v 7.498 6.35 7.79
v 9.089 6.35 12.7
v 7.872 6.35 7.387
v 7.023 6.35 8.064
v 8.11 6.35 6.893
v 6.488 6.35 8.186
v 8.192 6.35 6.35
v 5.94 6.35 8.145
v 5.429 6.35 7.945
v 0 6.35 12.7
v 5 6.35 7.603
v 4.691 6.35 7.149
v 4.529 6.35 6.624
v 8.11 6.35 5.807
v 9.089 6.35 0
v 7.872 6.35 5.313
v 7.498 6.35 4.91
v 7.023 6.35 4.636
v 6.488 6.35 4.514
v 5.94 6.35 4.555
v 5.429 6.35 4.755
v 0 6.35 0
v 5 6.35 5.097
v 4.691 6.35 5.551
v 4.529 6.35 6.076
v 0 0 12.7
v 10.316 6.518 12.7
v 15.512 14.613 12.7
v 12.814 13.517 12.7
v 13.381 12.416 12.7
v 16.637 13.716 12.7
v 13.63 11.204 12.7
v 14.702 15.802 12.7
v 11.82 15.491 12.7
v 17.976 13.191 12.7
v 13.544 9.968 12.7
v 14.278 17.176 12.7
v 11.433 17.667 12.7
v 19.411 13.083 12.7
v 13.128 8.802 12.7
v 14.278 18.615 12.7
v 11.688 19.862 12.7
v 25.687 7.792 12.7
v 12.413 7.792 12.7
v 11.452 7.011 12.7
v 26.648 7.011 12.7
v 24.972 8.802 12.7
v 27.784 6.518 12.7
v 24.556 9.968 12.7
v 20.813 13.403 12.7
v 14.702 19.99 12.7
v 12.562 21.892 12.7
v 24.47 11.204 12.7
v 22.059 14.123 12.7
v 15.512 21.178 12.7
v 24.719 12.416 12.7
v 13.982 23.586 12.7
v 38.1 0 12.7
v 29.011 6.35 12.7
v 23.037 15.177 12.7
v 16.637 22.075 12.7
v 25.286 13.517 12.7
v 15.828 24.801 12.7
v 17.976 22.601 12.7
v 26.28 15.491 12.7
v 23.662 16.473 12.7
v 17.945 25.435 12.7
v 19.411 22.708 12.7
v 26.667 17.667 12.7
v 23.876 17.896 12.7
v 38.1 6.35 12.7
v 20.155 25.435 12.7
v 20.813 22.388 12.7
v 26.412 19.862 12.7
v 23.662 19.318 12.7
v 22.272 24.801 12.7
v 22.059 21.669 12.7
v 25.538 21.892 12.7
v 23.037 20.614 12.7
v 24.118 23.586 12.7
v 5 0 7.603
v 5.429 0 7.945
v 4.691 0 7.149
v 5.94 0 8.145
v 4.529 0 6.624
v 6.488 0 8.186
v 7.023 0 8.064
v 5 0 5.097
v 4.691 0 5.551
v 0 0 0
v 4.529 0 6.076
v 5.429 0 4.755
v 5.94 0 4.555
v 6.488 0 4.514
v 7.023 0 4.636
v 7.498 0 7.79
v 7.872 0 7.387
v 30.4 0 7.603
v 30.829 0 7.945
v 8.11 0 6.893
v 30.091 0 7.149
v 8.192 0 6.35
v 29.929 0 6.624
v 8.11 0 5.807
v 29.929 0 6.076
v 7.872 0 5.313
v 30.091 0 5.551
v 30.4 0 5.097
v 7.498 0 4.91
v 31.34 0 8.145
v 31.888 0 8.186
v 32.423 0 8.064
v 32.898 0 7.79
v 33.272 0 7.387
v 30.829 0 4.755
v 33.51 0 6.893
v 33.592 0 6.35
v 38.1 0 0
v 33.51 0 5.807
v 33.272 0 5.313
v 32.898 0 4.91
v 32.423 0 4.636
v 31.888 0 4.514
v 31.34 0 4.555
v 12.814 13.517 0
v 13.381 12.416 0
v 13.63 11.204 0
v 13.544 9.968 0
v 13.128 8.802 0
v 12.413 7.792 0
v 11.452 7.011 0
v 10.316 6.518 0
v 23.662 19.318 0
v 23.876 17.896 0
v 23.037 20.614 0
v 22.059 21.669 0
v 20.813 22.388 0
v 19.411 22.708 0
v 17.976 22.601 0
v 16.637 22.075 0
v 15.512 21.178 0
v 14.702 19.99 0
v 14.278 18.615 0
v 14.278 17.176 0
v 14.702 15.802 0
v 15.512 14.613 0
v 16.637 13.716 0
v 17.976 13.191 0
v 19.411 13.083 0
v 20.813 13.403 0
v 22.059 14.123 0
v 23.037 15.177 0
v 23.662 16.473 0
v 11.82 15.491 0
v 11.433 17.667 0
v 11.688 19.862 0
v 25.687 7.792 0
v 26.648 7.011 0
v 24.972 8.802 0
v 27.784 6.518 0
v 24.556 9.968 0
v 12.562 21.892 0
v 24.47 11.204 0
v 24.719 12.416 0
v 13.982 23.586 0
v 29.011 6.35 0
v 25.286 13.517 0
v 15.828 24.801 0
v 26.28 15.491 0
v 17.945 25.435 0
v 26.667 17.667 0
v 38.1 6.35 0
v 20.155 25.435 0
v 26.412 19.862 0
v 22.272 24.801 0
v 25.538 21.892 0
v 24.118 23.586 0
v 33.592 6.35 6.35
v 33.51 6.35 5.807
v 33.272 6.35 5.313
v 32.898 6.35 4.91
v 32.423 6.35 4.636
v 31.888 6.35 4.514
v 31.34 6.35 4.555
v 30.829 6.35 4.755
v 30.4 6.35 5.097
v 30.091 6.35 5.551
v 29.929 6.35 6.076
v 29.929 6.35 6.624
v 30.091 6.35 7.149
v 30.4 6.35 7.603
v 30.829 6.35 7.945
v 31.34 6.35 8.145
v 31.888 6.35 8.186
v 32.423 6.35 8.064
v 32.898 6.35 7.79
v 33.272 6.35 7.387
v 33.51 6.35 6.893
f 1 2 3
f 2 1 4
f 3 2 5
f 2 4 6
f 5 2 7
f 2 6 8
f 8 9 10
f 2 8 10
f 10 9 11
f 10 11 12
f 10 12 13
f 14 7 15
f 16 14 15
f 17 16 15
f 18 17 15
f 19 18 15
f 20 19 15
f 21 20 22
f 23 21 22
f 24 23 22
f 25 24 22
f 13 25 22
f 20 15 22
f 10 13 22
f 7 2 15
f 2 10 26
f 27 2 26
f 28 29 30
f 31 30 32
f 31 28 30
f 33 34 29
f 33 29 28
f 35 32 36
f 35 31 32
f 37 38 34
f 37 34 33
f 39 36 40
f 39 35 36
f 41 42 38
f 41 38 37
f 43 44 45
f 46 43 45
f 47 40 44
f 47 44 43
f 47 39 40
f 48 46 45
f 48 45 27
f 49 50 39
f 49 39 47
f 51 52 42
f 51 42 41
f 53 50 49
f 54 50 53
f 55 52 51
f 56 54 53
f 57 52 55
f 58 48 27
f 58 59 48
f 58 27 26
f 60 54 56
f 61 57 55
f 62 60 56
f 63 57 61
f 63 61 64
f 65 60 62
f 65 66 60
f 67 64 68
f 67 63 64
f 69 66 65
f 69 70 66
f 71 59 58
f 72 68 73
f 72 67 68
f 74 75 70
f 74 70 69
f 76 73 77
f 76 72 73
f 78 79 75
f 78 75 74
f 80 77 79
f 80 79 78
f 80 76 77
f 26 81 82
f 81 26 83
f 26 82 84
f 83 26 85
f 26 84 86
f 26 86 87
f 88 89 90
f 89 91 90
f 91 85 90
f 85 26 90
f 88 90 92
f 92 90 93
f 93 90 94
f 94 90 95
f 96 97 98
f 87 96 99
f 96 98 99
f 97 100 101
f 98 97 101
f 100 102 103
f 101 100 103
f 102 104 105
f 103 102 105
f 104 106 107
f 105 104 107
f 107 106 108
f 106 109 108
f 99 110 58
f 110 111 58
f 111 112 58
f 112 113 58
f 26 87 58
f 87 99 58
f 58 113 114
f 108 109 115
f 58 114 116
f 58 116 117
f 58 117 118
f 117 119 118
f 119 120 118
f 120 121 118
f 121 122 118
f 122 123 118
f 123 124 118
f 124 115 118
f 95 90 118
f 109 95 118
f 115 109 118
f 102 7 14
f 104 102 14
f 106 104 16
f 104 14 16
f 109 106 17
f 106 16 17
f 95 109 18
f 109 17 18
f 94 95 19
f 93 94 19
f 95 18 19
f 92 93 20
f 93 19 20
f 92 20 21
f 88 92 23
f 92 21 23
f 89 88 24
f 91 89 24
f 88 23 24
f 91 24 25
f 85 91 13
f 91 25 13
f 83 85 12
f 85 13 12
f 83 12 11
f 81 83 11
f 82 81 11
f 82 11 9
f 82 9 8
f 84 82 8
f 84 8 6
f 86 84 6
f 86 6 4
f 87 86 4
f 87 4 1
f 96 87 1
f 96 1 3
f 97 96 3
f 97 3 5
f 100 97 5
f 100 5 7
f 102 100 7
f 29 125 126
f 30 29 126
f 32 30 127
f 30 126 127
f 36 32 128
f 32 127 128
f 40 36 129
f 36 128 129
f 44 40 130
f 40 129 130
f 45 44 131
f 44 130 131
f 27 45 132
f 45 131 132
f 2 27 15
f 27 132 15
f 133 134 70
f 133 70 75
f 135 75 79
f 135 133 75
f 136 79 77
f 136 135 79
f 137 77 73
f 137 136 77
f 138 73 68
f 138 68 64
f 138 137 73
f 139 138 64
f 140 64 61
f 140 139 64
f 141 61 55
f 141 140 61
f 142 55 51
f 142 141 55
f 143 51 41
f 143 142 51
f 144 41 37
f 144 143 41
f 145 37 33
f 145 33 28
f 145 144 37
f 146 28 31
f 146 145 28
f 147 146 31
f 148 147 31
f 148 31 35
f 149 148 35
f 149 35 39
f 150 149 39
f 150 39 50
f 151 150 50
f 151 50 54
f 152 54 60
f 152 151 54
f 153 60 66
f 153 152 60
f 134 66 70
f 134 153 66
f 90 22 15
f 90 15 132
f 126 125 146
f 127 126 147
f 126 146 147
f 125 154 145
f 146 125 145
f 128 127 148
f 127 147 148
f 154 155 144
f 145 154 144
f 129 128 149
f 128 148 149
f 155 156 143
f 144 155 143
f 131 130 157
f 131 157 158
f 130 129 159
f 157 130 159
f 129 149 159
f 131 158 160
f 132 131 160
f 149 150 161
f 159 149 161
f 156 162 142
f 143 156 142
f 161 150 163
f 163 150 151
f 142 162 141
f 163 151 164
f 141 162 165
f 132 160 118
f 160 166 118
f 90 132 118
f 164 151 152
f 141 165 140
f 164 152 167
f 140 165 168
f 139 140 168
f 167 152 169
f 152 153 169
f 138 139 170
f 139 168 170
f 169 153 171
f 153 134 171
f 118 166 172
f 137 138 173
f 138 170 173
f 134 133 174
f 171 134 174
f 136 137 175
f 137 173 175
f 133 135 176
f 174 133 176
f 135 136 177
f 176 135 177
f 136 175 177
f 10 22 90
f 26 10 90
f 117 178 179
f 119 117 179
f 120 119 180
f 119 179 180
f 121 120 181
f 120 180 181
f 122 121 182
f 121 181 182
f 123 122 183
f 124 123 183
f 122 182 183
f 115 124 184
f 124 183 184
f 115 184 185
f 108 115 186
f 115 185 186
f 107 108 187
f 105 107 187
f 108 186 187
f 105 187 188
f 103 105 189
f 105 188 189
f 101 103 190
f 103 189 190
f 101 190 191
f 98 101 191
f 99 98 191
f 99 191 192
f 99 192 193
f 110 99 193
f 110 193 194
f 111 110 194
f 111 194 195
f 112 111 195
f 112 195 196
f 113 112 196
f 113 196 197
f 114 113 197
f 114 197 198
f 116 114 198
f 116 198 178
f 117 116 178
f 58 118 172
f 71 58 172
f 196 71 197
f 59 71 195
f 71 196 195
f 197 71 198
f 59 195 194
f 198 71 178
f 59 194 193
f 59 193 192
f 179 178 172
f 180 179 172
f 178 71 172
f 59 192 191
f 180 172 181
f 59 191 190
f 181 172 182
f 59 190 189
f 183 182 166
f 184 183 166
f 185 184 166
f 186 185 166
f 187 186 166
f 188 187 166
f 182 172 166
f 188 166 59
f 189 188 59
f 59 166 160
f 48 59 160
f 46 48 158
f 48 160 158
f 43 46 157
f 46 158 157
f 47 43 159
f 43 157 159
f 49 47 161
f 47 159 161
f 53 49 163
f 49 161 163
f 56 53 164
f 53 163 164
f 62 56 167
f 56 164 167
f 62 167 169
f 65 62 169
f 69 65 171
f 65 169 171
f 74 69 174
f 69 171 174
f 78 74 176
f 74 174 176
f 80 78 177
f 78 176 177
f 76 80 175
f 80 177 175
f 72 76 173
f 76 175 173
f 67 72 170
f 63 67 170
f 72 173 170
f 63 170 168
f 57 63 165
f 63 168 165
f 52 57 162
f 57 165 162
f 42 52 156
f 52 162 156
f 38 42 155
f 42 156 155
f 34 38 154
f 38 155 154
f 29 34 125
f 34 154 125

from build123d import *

# Parameters (mm, degrees)
SKETCH1_R               = 4.826
BOSS_EXTRUDE1_DEPTH     = 12.7
SKETCH2_R               = 1.8415
CUT_EXTRUDE1_DEPTH      = 20.165748301
CUT_EXTRUDE1_DEPTH_BACK = 7.35


with BuildPart() as part:
    # Sketch1 → Boss-Extrude1 (new body)
    with BuildSketch(Plane.XY):
        with BuildLine():
            Line((0, 0), (38.1, 0))
            Line((38.1, 0), (38.1, 6.35))
            Line((38.1, 6.35), (29.010834454, 6.35))
            ThreePointArc((29.010834454, 6.35), (24.972383208, 8.802433287), (25.286109599, 13.516783004))
            ThreePointArc((25.286109599, 13.516783004), (19.05, 25.515748301), (12.813890401, 13.516783004))
            ThreePointArc((12.813890401, 13.516783004), (13.127616792, 8.802433287), (9.089165546, 6.35))
            Line((9.089165546, 6.35), (0, 6.35))
            Line((0, 6.35), (0, 0))
        make_face()
        with Locations((19.05, 17.895748301)):
            Circle(SKETCH1_R, mode=Mode.SUBTRACT)
    extrude(amount=BOSS_EXTRUDE1_DEPTH)

    # Sketch2 → Cut-Extrude1 (cut, two sides)
    with BuildSketch(Plane(origin=(0, 6.35, 0), x_dir=(1, 0, 0), z_dir=(0, 1, 0))) as cut_extrude1_sk:
        with Locations((6.35, -6.35)):
            Circle(SKETCH2_R)
        with Locations((31.75, -6.35)):
            Circle(SKETCH2_R)
    extrude(amount=CUT_EXTRUDE1_DEPTH, mode=Mode.SUBTRACT)
    extrude(cut_extrude1_sk.sketch, amount=-CUT_EXTRUDE1_DEPTH_BACK, mode=Mode.SUBTRACT)


solid = part.part
